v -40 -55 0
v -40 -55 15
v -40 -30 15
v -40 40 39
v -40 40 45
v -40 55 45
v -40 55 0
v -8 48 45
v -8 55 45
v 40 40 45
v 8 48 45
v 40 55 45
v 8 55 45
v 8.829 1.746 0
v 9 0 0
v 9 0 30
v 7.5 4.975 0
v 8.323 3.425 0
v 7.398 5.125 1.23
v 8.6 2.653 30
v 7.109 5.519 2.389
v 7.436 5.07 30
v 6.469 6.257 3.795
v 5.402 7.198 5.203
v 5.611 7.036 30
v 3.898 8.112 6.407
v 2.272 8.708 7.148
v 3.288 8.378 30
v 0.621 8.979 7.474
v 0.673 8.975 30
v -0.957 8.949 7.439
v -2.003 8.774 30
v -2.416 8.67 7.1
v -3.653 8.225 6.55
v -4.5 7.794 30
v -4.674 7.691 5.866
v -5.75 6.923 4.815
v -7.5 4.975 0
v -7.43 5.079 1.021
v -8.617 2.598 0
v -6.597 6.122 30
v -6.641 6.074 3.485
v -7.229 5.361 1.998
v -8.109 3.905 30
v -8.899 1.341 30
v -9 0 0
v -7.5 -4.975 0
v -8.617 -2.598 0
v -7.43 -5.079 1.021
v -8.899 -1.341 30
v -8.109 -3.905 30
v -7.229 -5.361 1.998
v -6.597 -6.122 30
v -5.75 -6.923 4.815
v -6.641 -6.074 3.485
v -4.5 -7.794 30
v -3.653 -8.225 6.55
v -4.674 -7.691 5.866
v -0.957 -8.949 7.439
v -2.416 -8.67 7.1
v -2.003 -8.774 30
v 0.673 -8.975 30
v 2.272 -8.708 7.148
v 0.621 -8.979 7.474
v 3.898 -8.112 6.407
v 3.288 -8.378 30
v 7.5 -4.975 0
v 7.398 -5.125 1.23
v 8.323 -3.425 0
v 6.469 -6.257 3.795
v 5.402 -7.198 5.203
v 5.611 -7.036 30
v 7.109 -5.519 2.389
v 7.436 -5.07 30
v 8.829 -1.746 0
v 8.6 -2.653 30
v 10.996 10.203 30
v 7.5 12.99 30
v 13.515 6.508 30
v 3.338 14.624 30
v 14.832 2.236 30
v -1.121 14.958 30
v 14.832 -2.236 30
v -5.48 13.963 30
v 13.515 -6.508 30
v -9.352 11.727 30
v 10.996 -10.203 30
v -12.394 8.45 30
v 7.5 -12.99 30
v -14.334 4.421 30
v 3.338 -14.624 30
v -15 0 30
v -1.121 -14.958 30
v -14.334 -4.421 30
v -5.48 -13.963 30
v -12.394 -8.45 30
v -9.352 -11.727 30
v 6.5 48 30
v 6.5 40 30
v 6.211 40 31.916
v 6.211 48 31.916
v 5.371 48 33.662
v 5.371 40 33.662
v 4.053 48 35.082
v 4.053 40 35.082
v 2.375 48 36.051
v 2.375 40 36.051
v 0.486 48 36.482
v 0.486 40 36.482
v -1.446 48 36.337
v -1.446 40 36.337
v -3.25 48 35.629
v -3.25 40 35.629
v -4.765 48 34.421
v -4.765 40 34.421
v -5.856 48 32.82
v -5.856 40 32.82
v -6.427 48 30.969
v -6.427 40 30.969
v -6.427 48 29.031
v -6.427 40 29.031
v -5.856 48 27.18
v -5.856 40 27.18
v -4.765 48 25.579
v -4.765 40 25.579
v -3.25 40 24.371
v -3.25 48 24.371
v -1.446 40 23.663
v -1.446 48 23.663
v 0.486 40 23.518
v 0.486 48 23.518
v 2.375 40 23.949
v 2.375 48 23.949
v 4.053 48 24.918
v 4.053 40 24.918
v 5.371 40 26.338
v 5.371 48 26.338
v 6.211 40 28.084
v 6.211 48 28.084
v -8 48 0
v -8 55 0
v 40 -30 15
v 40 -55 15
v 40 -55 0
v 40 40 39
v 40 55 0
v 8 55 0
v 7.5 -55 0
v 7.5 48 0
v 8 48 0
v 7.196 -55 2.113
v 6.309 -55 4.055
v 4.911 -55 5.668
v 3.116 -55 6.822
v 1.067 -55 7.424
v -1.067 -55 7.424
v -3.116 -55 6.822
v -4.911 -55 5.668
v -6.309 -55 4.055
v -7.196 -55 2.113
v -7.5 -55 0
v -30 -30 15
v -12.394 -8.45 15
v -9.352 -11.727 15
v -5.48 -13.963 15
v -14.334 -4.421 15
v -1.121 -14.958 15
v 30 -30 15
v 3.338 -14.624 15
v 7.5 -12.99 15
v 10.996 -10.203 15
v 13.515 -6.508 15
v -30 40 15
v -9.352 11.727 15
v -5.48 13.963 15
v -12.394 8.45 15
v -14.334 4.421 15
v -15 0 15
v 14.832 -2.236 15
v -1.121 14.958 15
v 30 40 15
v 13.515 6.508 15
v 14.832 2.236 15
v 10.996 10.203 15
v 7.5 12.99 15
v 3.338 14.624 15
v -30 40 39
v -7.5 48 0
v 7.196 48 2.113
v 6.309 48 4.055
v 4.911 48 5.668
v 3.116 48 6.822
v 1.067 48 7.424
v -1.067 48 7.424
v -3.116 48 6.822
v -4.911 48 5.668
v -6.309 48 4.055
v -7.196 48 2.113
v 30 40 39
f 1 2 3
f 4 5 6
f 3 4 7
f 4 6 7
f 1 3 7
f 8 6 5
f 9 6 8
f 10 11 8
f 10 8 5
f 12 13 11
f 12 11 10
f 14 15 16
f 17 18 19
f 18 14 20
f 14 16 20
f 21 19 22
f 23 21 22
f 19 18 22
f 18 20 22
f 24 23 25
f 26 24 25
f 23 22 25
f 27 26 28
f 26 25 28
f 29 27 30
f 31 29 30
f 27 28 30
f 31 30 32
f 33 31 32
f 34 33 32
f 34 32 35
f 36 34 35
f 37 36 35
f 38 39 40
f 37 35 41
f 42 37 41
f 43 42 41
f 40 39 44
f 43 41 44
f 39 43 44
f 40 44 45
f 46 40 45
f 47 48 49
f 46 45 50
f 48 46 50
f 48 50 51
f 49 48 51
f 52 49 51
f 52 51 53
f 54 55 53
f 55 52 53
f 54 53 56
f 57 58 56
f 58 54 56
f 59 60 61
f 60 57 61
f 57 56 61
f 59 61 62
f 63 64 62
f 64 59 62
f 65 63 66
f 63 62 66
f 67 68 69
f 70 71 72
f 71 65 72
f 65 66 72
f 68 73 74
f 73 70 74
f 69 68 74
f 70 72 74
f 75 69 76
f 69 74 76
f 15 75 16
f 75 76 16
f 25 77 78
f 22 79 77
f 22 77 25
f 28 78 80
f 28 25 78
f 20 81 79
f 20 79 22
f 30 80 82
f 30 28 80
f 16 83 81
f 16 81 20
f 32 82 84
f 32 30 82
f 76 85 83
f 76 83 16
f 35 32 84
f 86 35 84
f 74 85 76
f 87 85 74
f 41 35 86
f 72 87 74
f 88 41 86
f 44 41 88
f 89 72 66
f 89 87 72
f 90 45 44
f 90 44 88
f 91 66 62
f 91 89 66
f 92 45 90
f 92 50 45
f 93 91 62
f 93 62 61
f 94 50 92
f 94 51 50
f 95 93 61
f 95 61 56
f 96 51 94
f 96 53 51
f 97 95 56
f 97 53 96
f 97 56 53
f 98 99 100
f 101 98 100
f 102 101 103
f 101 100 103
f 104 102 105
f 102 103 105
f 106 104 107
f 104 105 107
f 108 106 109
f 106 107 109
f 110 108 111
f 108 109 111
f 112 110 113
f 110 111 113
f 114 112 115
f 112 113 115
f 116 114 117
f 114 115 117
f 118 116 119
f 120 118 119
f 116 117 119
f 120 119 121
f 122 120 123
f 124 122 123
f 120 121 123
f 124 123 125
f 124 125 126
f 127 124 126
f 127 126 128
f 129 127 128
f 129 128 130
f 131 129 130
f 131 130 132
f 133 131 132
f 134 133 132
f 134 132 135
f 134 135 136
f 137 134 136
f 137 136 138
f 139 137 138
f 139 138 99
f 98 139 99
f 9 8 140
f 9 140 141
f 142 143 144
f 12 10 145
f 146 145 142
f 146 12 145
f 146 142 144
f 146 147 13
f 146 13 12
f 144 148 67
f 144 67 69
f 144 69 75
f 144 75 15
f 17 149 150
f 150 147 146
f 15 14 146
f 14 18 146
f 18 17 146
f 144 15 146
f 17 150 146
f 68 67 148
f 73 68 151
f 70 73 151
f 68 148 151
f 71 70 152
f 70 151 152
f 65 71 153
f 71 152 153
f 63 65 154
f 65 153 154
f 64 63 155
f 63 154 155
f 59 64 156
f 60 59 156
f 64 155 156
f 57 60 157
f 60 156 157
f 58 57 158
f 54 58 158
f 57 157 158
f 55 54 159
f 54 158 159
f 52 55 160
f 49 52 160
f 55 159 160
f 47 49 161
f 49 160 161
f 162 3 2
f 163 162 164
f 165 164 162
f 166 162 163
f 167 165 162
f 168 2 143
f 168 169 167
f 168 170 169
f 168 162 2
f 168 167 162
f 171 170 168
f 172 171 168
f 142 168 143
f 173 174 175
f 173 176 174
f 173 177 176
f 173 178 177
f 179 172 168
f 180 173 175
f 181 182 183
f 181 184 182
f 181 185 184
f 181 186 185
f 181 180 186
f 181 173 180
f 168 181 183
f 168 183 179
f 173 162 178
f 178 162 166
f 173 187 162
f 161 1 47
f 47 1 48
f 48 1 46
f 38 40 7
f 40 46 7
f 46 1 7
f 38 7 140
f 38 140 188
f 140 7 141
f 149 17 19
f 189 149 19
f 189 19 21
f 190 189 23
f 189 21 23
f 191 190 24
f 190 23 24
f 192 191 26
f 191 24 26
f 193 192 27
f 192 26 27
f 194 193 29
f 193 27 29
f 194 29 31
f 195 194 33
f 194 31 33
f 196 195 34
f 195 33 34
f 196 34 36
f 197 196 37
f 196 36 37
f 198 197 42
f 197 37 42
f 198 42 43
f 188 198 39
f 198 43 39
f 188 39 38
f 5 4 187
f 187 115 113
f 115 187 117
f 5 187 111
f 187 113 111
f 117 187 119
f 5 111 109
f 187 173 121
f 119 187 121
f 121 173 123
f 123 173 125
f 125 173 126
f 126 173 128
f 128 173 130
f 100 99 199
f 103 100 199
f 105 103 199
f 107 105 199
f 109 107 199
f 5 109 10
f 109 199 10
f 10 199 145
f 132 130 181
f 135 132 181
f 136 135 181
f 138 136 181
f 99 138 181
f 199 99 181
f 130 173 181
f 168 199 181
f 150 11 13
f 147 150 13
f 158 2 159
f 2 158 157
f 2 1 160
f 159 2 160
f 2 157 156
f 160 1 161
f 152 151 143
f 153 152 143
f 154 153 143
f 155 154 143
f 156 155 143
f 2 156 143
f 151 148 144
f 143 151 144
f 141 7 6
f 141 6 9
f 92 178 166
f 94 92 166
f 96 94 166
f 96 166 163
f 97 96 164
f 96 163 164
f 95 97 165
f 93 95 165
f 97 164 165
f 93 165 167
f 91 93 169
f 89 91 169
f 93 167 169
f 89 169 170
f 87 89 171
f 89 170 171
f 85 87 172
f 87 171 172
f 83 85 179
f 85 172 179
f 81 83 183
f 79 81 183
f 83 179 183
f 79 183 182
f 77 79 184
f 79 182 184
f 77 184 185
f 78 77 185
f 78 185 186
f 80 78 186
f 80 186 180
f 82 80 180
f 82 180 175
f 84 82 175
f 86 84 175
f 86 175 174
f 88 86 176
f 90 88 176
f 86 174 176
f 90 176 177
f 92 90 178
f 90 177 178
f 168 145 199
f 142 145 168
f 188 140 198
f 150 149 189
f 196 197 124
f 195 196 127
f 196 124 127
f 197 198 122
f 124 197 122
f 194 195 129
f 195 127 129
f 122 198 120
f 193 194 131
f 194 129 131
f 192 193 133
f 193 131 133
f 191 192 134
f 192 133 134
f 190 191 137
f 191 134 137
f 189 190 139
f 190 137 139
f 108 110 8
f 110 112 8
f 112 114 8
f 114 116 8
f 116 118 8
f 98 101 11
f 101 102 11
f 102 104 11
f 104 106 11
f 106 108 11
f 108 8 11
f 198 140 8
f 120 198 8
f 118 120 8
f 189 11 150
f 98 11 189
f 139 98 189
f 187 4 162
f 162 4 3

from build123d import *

# Parameters (mm, degrees)
SKETCH_1_W          = 80
SKETCH_1_H          = 110
EXTRUDE_1_DEPTH     = 15
SKETCH_2_W          = 80
SKETCH_2_H          = 15
EXTRUDE_2_DEPTH     = 30
EXTRUDE_3_DEPTH     = 10
SKETCH_4_R          = 15
EXTRUDE_4_DEPTH     = 15
SKETCH_5_R          = 9
CUT_EXTRUDE_1_DEPTH = 75.330343737
SKETCH_6_R          = 6.5
CUT_EXTRUDE_2_DEPTH = 113.472218792
SKETCH_7_R          = 7.5
CUT_EXTRUDE_3_DEPTH = 126.39936204
SKETCH_8_W          = 16
SKETCH_8_H          = 7
CUT_EXTRUDE_4_DEPTH = 82.547532274


with BuildPart() as part:
    # Эскиз1 → Бобышка-Вытянуть1 (new body)
    with BuildSketch(Plane.XY):
        Rectangle(SKETCH_1_W, SKETCH_1_H)
    extrude(amount=EXTRUDE_1_DEPTH)

    # Эскиз2 → Бобышка-Вытянуть2 (add)
    with BuildSketch(Plane.XY.offset(15)):
        with Locations((0, 47.5)):
            Rectangle(SKETCH_2_W, SKETCH_2_H)
    extrude(amount=EXTRUDE_2_DEPTH)

    # Эскиз3 → Бобышка-Вытянуть3 (add)
    with BuildSketch(Plane(origin=(40, 0, 0), x_dir=(0, 0, -1), z_dir=(1, 0, 0))):
        Polygon((-39, 40), (-15, -30), (-15, 40), align=None)
    extrude_3 = extrude(amount=-EXTRUDE_3_DEPTH)

    # Зеркальное отражение1: Бобышка-Вытянуть3 across plane
    add(extrude_3.mirror(Plane(origin=(0, 0, 0), x_dir=(0, 0, 1), z_dir=(1, 0, 0))))

    # Эскиз4 → Бобышка-Вытянуть4 (add)
    with BuildSketch(Plane.XY.offset(15)):
        with Locations(Location((0, 0, 0), (0, 0, 180))):
            Circle(SKETCH_4_R)
    extrude(amount=EXTRUDE_4_DEPTH)

    # Эскиз5 → Вырез-Вытянуть1 (cut, through all)
    with BuildSketch(Plane.XY.offset(30)):
        Circle(SKETCH_5_R)
    extrude(amount=-CUT_EXTRUDE_1_DEPTH, mode=Mode.SUBTRACT)

    # Эскиз6 → Вырез-Вытянуть2 (cut, through all)
    with BuildSketch(Plane.XZ.offset(-40)):
        with Locations((0, 30)):
            Circle(SKETCH_6_R)
    extrude(amount=-CUT_EXTRUDE_2_DEPTH, mode=Mode.SUBTRACT)

    # Эскиз7 → Вырез-Вытянуть3 (cut, through all)
    with BuildSketch(Plane.XZ.offset(55)):
        Circle(SKETCH_7_R)
    extrude(amount=-CUT_EXTRUDE_3_DEPTH, mode=Mode.SUBTRACT)

    # Эскиз8 → Вырез-Вытянуть4 (cut, through all)
    with BuildSketch(Plane.XY.offset(45)):
        with Locations((0, 51.5)):
            Rectangle(SKETCH_8_W, SKETCH_8_H)
    extrude(amount=-CUT_EXTRUDE_4_DEPTH, mode=Mode.SUBTRACT)


solid = part.part
